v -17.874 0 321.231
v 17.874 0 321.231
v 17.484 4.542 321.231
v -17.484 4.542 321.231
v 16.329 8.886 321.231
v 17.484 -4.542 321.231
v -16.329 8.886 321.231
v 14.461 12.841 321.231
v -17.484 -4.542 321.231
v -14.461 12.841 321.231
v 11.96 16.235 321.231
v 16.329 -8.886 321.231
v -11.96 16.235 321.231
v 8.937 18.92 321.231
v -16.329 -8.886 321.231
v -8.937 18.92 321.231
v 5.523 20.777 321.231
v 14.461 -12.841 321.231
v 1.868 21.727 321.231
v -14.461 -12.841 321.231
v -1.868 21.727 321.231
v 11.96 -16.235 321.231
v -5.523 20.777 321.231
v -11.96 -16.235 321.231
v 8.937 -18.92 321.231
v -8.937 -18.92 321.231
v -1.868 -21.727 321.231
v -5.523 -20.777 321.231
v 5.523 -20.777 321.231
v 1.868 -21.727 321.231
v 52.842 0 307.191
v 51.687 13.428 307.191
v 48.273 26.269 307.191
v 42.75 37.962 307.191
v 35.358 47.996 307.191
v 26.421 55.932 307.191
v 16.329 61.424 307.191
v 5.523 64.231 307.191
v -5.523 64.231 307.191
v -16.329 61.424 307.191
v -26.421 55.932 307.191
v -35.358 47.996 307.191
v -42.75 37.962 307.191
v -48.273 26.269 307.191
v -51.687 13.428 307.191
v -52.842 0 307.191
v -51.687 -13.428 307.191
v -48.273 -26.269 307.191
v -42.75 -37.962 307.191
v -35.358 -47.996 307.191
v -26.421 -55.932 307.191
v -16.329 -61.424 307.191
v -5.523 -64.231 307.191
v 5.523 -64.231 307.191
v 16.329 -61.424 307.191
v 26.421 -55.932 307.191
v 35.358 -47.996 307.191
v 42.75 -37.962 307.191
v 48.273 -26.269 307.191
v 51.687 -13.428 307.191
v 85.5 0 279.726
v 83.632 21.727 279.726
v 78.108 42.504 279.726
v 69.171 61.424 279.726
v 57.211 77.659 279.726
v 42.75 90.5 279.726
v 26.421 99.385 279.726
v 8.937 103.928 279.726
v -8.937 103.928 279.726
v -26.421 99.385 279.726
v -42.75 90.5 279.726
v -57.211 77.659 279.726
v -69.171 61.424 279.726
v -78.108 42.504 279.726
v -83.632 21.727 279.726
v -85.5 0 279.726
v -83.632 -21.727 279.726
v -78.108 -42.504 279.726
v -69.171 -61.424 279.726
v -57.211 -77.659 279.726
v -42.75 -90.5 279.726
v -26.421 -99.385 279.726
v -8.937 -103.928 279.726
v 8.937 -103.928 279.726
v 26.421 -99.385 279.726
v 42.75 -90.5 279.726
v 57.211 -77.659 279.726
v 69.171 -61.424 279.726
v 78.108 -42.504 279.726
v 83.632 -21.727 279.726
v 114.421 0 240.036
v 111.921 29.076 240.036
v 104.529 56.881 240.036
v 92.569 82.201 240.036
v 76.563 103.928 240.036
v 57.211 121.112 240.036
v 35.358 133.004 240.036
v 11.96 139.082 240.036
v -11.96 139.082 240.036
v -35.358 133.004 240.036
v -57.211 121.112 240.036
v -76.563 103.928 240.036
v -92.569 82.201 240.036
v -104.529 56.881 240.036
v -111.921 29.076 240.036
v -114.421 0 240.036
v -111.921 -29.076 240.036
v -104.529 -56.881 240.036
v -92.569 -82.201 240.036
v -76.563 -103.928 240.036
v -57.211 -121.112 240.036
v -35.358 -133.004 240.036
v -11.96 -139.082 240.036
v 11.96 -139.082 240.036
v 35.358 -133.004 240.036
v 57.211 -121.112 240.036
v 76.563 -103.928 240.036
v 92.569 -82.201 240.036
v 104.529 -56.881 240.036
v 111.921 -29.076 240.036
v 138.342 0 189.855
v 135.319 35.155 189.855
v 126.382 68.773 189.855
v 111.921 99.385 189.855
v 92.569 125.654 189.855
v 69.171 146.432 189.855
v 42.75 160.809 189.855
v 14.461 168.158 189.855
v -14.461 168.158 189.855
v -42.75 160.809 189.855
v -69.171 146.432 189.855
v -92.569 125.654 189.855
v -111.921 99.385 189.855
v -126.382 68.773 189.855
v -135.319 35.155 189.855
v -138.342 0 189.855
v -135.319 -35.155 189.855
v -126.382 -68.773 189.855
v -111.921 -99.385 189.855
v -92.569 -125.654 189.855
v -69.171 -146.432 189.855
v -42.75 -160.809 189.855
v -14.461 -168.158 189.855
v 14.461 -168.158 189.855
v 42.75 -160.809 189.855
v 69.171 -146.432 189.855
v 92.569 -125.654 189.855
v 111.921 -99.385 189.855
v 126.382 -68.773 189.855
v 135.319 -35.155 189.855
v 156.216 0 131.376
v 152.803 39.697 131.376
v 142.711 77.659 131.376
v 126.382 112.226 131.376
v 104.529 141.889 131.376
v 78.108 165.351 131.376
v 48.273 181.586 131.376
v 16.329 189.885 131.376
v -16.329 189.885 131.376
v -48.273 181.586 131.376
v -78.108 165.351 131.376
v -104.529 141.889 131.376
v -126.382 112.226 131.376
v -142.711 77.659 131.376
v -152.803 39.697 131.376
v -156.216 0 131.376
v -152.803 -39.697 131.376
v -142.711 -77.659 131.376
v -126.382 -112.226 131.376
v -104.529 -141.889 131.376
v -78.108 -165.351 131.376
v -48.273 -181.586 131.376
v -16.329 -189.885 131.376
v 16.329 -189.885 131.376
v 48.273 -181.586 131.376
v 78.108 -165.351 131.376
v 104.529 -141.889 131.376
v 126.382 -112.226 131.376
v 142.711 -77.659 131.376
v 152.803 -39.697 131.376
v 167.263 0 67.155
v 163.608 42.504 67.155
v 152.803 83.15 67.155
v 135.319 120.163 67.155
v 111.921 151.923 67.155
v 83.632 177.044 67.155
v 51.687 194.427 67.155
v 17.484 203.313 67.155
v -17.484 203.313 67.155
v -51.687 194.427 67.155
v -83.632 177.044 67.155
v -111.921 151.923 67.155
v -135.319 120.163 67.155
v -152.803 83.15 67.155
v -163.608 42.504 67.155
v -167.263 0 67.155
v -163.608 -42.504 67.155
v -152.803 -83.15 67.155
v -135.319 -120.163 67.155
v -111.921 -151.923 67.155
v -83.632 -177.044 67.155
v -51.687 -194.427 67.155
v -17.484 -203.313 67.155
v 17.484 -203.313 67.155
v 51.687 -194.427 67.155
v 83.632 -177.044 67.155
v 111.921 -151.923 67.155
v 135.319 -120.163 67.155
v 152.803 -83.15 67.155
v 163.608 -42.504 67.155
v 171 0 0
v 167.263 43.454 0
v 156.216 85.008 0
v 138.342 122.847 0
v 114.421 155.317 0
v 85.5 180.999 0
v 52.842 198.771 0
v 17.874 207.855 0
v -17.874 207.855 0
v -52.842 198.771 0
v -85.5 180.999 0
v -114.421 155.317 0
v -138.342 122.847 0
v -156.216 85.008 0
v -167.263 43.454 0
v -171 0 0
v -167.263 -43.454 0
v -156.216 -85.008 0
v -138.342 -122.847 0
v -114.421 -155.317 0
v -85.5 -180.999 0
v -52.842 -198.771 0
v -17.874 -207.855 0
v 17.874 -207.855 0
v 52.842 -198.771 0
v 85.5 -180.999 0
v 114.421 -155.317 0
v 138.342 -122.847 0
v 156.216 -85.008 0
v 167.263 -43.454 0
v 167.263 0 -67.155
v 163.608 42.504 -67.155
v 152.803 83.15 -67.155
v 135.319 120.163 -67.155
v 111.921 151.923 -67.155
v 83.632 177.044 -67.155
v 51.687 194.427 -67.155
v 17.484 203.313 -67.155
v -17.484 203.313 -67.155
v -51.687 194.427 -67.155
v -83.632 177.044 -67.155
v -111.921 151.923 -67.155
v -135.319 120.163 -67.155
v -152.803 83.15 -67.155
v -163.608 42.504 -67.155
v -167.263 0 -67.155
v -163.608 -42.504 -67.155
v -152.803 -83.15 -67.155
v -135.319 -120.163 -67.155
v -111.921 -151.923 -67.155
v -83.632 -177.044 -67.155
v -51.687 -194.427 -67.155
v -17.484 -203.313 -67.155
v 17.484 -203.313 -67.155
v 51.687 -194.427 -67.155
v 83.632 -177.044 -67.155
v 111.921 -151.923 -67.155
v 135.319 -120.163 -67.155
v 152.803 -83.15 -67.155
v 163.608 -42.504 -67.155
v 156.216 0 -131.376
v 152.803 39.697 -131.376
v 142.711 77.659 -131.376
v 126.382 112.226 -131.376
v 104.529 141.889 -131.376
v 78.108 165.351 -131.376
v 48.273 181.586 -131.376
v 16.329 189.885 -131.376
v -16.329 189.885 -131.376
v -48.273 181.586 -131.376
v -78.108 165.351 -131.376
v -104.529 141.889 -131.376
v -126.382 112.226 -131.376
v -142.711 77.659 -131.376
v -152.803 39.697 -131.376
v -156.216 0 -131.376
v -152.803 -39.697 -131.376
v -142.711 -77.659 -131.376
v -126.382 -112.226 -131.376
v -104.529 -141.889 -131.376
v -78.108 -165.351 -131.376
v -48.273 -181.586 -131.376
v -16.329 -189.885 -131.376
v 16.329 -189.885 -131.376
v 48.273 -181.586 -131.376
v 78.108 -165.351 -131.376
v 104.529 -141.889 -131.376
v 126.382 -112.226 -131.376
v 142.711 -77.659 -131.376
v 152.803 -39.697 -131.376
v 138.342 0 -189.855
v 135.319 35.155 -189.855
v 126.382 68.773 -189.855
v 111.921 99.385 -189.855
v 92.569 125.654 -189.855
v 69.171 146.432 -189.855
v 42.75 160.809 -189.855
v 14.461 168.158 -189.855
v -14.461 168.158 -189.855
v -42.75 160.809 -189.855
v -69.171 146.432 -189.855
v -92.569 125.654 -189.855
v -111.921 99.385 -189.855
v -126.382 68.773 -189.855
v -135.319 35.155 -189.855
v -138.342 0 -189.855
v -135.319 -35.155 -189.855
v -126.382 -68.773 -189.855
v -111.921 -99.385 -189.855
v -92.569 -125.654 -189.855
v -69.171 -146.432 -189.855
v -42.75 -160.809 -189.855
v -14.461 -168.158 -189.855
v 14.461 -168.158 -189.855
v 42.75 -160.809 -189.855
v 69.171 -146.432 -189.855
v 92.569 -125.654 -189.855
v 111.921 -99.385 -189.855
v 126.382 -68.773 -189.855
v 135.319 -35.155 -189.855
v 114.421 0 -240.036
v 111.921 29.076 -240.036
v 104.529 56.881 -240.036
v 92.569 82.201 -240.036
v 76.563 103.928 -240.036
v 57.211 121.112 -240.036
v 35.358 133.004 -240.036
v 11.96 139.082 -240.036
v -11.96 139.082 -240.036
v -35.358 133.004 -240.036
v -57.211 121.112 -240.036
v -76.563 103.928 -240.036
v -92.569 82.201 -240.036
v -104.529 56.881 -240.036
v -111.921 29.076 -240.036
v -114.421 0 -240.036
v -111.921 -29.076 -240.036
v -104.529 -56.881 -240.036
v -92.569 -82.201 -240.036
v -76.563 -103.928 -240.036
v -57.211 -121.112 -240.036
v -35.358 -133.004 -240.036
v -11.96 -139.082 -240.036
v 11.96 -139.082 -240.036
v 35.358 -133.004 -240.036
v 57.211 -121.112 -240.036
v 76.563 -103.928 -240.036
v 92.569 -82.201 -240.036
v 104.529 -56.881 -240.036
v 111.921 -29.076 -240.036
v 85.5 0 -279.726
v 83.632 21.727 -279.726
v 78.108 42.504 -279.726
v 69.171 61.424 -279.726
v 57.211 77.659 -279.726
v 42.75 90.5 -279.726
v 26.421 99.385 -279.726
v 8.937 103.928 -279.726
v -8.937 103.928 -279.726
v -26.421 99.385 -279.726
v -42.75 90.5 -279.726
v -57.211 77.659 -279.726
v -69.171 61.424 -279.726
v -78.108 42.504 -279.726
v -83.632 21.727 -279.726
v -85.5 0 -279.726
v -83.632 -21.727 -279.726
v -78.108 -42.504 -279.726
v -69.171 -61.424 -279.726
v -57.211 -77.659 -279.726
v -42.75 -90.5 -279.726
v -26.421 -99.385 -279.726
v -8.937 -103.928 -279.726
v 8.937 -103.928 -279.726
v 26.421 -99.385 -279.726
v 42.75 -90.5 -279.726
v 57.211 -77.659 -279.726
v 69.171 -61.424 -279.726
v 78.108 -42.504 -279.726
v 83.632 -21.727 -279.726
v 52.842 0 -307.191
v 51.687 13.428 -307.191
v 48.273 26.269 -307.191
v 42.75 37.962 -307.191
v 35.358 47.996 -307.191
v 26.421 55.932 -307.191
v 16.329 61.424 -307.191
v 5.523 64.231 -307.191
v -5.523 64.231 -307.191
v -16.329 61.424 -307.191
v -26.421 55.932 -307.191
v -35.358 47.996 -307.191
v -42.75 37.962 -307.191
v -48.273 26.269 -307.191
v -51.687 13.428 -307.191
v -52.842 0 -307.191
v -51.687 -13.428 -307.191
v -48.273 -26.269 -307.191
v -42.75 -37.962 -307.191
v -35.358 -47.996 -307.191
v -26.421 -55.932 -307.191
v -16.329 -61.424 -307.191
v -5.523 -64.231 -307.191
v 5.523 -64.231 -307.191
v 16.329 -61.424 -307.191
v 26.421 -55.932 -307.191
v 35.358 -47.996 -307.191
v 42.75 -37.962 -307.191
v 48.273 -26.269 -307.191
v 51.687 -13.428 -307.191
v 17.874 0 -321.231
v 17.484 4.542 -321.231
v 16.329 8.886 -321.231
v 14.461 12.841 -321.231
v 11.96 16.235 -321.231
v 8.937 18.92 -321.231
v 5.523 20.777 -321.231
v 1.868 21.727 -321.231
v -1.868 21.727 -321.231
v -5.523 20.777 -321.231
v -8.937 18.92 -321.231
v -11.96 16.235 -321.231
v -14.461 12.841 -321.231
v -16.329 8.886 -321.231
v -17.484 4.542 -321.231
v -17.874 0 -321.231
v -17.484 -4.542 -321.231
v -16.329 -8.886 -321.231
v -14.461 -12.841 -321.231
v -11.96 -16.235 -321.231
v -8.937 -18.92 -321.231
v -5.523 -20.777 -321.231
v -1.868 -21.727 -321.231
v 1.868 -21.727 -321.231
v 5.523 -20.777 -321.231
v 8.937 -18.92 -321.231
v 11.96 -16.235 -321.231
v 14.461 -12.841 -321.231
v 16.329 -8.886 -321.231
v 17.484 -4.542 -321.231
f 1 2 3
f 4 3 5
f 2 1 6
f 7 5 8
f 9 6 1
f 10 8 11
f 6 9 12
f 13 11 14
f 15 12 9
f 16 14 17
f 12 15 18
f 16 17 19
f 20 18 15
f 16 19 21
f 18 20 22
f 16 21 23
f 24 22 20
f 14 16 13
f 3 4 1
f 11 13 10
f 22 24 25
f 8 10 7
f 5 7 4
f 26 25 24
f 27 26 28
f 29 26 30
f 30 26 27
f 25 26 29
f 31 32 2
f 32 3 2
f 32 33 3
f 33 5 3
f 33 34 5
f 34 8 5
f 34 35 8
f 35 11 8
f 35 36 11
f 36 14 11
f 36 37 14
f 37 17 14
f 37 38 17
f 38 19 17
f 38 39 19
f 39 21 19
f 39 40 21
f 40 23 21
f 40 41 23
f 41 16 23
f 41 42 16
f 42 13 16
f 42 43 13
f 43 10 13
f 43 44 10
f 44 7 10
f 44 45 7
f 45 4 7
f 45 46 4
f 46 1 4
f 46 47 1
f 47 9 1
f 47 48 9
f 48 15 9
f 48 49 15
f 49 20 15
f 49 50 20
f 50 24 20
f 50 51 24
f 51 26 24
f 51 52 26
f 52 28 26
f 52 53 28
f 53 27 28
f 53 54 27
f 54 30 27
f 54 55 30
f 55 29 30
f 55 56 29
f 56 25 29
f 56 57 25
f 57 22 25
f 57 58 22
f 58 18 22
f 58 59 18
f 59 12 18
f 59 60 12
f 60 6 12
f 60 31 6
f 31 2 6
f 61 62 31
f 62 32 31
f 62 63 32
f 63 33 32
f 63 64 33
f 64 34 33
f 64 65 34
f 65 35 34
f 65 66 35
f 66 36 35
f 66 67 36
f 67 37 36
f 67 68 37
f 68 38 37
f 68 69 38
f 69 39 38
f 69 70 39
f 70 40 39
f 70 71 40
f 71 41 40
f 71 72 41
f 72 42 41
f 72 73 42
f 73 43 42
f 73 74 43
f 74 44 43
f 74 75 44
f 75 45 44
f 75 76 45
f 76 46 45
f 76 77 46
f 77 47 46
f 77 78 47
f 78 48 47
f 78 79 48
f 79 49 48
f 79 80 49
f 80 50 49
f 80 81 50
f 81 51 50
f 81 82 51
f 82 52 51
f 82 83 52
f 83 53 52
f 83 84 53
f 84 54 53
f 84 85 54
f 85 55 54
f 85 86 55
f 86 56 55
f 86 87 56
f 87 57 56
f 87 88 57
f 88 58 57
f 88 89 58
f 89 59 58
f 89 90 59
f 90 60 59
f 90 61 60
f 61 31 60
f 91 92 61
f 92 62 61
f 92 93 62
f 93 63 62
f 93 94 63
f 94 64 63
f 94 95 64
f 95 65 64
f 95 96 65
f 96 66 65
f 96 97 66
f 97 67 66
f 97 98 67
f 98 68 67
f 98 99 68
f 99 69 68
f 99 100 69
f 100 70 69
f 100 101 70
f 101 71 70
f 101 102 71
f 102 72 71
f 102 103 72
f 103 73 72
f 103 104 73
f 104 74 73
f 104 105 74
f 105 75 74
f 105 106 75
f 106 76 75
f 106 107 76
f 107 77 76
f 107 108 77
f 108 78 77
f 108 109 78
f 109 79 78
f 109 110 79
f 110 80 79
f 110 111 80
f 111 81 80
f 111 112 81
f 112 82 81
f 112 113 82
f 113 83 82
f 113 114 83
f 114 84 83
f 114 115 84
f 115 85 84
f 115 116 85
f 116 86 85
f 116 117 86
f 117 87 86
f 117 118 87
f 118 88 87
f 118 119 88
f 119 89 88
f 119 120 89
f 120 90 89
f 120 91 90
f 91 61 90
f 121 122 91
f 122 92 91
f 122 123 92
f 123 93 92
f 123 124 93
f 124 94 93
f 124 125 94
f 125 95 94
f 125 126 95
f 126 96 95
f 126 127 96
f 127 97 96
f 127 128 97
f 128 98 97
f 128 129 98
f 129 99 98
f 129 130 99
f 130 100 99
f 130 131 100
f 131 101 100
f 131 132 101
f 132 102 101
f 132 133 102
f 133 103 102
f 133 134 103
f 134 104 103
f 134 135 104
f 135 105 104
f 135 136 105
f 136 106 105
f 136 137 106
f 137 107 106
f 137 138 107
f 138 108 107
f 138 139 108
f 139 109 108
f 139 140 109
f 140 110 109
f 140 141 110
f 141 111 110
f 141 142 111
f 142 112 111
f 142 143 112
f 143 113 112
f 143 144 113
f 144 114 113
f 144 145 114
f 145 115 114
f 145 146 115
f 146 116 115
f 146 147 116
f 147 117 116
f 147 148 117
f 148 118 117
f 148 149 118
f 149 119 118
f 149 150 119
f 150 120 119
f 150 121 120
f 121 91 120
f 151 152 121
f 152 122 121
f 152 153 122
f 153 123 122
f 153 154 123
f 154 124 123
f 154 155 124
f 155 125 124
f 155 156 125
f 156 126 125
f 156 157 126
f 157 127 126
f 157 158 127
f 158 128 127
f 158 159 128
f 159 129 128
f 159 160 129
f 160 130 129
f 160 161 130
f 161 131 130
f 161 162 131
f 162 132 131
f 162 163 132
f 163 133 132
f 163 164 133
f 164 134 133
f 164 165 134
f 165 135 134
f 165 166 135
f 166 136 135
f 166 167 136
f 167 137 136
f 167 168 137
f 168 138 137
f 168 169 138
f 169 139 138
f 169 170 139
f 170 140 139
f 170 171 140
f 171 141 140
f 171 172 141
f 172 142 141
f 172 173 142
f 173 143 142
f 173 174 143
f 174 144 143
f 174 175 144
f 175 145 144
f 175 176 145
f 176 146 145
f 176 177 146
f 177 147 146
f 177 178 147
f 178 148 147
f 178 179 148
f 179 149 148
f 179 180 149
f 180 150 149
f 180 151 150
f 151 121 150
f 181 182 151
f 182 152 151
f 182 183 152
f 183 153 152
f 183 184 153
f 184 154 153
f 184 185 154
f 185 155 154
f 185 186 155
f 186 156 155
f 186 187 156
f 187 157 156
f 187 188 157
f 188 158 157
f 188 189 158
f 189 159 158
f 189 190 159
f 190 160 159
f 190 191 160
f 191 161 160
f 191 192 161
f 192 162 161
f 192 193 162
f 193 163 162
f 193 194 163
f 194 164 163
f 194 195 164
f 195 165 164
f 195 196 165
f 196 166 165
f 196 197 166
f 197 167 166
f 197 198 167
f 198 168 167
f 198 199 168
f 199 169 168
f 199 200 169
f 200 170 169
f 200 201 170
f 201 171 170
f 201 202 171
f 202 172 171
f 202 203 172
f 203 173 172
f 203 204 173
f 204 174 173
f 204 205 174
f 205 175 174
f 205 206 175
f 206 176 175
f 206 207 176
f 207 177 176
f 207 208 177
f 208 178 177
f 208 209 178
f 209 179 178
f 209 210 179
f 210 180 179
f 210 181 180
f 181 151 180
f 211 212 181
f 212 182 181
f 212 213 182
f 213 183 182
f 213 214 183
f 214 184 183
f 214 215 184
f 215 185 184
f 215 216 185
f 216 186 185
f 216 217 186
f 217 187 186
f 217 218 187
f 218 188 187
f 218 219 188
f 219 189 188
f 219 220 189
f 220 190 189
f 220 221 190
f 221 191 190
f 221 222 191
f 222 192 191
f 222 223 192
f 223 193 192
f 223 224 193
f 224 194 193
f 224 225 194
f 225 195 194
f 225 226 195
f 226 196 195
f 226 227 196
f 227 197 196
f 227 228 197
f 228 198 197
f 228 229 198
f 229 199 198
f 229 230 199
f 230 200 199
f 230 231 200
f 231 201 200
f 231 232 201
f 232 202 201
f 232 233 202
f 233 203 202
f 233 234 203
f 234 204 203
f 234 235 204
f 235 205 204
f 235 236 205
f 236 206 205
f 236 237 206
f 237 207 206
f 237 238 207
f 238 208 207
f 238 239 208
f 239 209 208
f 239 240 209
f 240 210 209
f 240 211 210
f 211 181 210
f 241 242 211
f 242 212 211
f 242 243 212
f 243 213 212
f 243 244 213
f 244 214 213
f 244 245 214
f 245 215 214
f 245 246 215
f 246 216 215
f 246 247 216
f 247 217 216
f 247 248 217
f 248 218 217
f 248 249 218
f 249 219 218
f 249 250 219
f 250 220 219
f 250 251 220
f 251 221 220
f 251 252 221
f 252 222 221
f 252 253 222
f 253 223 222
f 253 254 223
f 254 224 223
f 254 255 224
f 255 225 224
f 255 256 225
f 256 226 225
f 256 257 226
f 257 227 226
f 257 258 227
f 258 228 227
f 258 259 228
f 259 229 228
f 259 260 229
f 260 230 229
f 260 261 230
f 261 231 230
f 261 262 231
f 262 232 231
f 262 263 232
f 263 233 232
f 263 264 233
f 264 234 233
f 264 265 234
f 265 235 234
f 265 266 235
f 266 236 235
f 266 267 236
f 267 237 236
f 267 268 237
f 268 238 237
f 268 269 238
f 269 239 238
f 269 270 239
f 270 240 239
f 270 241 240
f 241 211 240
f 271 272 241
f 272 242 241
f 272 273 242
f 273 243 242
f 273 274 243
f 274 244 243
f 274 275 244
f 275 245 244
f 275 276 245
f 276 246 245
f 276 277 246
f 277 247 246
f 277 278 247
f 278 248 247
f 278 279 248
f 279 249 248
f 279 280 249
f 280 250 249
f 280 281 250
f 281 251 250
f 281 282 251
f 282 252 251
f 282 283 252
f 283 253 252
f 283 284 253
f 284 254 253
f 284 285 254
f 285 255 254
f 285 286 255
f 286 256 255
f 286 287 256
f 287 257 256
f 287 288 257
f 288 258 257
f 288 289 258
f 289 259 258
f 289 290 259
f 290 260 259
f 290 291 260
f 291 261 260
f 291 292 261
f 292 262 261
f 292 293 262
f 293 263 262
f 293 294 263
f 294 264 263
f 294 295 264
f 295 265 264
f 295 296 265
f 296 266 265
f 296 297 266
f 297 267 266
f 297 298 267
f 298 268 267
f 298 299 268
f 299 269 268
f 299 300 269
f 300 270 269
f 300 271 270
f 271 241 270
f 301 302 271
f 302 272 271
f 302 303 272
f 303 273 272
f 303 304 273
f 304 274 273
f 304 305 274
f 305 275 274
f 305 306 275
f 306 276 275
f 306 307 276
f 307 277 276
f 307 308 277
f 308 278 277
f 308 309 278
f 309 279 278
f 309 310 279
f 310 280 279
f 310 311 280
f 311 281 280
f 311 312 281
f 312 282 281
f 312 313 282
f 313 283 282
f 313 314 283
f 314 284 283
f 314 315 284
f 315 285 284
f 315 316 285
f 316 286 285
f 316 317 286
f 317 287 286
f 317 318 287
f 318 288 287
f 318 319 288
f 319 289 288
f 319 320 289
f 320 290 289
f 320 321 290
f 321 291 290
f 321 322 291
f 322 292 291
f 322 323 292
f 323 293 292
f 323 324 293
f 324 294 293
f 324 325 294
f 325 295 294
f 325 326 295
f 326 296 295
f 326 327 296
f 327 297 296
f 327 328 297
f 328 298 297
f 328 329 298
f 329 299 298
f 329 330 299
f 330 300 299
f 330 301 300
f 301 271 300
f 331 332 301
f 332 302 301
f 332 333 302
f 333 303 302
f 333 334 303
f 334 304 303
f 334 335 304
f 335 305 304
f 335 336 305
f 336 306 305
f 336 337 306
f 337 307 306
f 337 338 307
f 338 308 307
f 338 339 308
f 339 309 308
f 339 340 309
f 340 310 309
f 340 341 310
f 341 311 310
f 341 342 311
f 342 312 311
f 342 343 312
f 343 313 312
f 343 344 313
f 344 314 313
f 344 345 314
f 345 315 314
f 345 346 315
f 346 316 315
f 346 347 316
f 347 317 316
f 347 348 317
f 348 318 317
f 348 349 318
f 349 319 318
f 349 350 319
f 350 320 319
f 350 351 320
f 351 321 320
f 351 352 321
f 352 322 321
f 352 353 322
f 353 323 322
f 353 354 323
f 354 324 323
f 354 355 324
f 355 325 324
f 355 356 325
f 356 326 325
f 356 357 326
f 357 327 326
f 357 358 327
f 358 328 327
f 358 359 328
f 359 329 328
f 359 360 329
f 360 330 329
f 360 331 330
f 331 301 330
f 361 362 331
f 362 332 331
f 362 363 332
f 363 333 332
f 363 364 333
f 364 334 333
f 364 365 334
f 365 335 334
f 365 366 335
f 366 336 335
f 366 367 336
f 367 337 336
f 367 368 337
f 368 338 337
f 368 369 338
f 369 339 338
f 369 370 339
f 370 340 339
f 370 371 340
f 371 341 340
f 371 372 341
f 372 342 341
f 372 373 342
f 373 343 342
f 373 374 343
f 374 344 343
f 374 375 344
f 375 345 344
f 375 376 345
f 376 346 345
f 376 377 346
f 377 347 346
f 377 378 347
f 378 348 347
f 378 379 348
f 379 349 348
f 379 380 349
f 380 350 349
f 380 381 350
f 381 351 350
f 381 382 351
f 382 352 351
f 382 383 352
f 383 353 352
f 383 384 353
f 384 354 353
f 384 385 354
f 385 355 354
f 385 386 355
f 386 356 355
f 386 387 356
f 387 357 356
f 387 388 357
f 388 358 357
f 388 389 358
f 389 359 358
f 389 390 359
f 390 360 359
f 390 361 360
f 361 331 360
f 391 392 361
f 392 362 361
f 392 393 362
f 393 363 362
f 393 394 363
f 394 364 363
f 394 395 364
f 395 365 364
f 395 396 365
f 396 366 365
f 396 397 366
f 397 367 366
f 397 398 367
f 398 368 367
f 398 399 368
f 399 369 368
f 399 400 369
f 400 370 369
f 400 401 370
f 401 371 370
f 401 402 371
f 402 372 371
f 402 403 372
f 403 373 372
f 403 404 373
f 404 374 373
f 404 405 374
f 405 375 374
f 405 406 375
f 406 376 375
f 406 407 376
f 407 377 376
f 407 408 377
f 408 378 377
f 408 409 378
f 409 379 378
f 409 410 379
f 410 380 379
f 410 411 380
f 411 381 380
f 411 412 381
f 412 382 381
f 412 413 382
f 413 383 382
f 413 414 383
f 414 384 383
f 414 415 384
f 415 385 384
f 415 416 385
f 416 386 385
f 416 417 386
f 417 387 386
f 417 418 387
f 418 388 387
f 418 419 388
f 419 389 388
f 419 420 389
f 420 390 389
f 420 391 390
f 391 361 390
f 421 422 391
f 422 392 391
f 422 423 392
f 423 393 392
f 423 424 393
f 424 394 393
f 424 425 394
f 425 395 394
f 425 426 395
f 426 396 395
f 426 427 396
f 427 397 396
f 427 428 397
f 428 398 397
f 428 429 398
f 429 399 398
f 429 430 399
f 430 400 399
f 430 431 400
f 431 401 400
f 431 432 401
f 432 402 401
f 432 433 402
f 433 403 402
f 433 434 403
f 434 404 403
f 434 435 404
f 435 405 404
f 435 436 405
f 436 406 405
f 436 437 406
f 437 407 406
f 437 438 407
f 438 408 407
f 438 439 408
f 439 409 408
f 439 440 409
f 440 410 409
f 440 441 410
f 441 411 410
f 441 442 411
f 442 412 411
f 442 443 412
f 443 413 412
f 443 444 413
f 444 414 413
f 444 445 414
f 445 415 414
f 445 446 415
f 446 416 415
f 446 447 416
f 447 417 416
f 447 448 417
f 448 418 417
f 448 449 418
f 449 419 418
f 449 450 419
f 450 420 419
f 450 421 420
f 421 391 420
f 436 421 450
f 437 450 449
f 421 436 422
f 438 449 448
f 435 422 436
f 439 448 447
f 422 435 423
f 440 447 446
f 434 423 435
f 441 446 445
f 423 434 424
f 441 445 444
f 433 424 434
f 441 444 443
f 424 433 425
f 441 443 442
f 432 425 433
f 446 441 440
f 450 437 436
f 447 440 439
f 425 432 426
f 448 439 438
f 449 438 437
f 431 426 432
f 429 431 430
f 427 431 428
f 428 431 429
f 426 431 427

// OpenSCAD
// Generated by SolidPython 1.0.1 on 2020-07-29 00:46:48


scale(v = [9, 11, 17]) {
	sphere(r = 19);
}
/***********************************************
*********      SolidPython code:      **********
************************************************
 
# import packages: SolidPython
from solid import *
from solid.utils import *
from itertools import chain, combinations, permutations


class Resize:

    def __init__(self, scad_file):
        self.scad_file = scad_file
        #self.scad_file = import_scad(scad_file)
        # cone/cylinder param:
        self.r1 = 0
        self.r2 = 0
        self.h = 0
        # rectangular prism param:
        self.w = 0
        self.l = 0
        # ellipse param:
        self.r = 0

    # import OpenScad code (file name corresponds to shape)


    # classify shape + parameters
    def assign(self, param1, param2, param3):
        if self.scad_file == 'cone.scad':
            self.r1 = param1
            self.r2 = param2
            self.h = param3
        elif self.scad_file == 'cylinder.scad':
            self.r1 = param1
            self.r2 = param2
            self.h = param3
        elif self.scad_file == 'rectangularPrism.scad':
            self.h = param1
            self.l = param2
            self.w = param3
        else:
            self.r = param1
            self.h = param2

    # resize parameters
    def iterate(self):
        x = range(3, 20, 2)
        i = 1
        if self.scad_file == 'cone.scad':
            tempList = list(permutations(x, 2))
            for temp in tempList:
                param1 = temp[0]
                param2 = temp[1]
                filepath = 'produced_scad_files/' + 'cone' + str(param1) + '_' + str(param2) + '_' + '.scad'
                scad_render_to_file(cylinder(h=param1, r1=param2, r2=0), filepath)

        elif self.scad_file == 'cylinder.scad':
            tempList = list(permutations(x, 3))
            for temp in tempList:
                param1 = temp[0]
                param2 = temp[1]
                filepath = 'produced_scad_files/' + 'cylinder' + str(param1) + '_' + str(param2) + '_' + '.scad'
                scad_render_to_file(cylinder(h=param1, r1=param2, r2=param2), filepath)

        elif self.scad_file == 'rectangularPrism.scad':
            tempList = list(permutations(x, 3))
            for temp in tempList:
                param1 = temp[0]
                param2 = temp[1]
                param3 = temp[2]
                filepath = 'produced_scad_files/' + 'rectangularPrism' + str(param1) + '_' + str(param2) + '_' + str(
                    param3) + '.scad'
                scad_render_to_file(cube(size=(param1, param2, param3)), filepath)

        elif self.scad_file == 'ellipse.scad':
            tempList = list(permutations(x, 4))
            for temp in tempList:
                param1 = temp[0]
                param2 = temp[1]
                param3 = temp[2]
                param4 = temp[3]
                filepath = 'produced_scad_files/' + 'ellipse' + str(param1) + '_' + str(param2) + '_' + str(param3) + '_' + str(param4) + '.scad'
                scad_render_to_file(scale([param1, param2, param3])(sphere(r=param4)), filepath)

    def render_to_scadfile(self):
        scad_render_to_file(scad, 'example.scad') 
 
************************************************/
